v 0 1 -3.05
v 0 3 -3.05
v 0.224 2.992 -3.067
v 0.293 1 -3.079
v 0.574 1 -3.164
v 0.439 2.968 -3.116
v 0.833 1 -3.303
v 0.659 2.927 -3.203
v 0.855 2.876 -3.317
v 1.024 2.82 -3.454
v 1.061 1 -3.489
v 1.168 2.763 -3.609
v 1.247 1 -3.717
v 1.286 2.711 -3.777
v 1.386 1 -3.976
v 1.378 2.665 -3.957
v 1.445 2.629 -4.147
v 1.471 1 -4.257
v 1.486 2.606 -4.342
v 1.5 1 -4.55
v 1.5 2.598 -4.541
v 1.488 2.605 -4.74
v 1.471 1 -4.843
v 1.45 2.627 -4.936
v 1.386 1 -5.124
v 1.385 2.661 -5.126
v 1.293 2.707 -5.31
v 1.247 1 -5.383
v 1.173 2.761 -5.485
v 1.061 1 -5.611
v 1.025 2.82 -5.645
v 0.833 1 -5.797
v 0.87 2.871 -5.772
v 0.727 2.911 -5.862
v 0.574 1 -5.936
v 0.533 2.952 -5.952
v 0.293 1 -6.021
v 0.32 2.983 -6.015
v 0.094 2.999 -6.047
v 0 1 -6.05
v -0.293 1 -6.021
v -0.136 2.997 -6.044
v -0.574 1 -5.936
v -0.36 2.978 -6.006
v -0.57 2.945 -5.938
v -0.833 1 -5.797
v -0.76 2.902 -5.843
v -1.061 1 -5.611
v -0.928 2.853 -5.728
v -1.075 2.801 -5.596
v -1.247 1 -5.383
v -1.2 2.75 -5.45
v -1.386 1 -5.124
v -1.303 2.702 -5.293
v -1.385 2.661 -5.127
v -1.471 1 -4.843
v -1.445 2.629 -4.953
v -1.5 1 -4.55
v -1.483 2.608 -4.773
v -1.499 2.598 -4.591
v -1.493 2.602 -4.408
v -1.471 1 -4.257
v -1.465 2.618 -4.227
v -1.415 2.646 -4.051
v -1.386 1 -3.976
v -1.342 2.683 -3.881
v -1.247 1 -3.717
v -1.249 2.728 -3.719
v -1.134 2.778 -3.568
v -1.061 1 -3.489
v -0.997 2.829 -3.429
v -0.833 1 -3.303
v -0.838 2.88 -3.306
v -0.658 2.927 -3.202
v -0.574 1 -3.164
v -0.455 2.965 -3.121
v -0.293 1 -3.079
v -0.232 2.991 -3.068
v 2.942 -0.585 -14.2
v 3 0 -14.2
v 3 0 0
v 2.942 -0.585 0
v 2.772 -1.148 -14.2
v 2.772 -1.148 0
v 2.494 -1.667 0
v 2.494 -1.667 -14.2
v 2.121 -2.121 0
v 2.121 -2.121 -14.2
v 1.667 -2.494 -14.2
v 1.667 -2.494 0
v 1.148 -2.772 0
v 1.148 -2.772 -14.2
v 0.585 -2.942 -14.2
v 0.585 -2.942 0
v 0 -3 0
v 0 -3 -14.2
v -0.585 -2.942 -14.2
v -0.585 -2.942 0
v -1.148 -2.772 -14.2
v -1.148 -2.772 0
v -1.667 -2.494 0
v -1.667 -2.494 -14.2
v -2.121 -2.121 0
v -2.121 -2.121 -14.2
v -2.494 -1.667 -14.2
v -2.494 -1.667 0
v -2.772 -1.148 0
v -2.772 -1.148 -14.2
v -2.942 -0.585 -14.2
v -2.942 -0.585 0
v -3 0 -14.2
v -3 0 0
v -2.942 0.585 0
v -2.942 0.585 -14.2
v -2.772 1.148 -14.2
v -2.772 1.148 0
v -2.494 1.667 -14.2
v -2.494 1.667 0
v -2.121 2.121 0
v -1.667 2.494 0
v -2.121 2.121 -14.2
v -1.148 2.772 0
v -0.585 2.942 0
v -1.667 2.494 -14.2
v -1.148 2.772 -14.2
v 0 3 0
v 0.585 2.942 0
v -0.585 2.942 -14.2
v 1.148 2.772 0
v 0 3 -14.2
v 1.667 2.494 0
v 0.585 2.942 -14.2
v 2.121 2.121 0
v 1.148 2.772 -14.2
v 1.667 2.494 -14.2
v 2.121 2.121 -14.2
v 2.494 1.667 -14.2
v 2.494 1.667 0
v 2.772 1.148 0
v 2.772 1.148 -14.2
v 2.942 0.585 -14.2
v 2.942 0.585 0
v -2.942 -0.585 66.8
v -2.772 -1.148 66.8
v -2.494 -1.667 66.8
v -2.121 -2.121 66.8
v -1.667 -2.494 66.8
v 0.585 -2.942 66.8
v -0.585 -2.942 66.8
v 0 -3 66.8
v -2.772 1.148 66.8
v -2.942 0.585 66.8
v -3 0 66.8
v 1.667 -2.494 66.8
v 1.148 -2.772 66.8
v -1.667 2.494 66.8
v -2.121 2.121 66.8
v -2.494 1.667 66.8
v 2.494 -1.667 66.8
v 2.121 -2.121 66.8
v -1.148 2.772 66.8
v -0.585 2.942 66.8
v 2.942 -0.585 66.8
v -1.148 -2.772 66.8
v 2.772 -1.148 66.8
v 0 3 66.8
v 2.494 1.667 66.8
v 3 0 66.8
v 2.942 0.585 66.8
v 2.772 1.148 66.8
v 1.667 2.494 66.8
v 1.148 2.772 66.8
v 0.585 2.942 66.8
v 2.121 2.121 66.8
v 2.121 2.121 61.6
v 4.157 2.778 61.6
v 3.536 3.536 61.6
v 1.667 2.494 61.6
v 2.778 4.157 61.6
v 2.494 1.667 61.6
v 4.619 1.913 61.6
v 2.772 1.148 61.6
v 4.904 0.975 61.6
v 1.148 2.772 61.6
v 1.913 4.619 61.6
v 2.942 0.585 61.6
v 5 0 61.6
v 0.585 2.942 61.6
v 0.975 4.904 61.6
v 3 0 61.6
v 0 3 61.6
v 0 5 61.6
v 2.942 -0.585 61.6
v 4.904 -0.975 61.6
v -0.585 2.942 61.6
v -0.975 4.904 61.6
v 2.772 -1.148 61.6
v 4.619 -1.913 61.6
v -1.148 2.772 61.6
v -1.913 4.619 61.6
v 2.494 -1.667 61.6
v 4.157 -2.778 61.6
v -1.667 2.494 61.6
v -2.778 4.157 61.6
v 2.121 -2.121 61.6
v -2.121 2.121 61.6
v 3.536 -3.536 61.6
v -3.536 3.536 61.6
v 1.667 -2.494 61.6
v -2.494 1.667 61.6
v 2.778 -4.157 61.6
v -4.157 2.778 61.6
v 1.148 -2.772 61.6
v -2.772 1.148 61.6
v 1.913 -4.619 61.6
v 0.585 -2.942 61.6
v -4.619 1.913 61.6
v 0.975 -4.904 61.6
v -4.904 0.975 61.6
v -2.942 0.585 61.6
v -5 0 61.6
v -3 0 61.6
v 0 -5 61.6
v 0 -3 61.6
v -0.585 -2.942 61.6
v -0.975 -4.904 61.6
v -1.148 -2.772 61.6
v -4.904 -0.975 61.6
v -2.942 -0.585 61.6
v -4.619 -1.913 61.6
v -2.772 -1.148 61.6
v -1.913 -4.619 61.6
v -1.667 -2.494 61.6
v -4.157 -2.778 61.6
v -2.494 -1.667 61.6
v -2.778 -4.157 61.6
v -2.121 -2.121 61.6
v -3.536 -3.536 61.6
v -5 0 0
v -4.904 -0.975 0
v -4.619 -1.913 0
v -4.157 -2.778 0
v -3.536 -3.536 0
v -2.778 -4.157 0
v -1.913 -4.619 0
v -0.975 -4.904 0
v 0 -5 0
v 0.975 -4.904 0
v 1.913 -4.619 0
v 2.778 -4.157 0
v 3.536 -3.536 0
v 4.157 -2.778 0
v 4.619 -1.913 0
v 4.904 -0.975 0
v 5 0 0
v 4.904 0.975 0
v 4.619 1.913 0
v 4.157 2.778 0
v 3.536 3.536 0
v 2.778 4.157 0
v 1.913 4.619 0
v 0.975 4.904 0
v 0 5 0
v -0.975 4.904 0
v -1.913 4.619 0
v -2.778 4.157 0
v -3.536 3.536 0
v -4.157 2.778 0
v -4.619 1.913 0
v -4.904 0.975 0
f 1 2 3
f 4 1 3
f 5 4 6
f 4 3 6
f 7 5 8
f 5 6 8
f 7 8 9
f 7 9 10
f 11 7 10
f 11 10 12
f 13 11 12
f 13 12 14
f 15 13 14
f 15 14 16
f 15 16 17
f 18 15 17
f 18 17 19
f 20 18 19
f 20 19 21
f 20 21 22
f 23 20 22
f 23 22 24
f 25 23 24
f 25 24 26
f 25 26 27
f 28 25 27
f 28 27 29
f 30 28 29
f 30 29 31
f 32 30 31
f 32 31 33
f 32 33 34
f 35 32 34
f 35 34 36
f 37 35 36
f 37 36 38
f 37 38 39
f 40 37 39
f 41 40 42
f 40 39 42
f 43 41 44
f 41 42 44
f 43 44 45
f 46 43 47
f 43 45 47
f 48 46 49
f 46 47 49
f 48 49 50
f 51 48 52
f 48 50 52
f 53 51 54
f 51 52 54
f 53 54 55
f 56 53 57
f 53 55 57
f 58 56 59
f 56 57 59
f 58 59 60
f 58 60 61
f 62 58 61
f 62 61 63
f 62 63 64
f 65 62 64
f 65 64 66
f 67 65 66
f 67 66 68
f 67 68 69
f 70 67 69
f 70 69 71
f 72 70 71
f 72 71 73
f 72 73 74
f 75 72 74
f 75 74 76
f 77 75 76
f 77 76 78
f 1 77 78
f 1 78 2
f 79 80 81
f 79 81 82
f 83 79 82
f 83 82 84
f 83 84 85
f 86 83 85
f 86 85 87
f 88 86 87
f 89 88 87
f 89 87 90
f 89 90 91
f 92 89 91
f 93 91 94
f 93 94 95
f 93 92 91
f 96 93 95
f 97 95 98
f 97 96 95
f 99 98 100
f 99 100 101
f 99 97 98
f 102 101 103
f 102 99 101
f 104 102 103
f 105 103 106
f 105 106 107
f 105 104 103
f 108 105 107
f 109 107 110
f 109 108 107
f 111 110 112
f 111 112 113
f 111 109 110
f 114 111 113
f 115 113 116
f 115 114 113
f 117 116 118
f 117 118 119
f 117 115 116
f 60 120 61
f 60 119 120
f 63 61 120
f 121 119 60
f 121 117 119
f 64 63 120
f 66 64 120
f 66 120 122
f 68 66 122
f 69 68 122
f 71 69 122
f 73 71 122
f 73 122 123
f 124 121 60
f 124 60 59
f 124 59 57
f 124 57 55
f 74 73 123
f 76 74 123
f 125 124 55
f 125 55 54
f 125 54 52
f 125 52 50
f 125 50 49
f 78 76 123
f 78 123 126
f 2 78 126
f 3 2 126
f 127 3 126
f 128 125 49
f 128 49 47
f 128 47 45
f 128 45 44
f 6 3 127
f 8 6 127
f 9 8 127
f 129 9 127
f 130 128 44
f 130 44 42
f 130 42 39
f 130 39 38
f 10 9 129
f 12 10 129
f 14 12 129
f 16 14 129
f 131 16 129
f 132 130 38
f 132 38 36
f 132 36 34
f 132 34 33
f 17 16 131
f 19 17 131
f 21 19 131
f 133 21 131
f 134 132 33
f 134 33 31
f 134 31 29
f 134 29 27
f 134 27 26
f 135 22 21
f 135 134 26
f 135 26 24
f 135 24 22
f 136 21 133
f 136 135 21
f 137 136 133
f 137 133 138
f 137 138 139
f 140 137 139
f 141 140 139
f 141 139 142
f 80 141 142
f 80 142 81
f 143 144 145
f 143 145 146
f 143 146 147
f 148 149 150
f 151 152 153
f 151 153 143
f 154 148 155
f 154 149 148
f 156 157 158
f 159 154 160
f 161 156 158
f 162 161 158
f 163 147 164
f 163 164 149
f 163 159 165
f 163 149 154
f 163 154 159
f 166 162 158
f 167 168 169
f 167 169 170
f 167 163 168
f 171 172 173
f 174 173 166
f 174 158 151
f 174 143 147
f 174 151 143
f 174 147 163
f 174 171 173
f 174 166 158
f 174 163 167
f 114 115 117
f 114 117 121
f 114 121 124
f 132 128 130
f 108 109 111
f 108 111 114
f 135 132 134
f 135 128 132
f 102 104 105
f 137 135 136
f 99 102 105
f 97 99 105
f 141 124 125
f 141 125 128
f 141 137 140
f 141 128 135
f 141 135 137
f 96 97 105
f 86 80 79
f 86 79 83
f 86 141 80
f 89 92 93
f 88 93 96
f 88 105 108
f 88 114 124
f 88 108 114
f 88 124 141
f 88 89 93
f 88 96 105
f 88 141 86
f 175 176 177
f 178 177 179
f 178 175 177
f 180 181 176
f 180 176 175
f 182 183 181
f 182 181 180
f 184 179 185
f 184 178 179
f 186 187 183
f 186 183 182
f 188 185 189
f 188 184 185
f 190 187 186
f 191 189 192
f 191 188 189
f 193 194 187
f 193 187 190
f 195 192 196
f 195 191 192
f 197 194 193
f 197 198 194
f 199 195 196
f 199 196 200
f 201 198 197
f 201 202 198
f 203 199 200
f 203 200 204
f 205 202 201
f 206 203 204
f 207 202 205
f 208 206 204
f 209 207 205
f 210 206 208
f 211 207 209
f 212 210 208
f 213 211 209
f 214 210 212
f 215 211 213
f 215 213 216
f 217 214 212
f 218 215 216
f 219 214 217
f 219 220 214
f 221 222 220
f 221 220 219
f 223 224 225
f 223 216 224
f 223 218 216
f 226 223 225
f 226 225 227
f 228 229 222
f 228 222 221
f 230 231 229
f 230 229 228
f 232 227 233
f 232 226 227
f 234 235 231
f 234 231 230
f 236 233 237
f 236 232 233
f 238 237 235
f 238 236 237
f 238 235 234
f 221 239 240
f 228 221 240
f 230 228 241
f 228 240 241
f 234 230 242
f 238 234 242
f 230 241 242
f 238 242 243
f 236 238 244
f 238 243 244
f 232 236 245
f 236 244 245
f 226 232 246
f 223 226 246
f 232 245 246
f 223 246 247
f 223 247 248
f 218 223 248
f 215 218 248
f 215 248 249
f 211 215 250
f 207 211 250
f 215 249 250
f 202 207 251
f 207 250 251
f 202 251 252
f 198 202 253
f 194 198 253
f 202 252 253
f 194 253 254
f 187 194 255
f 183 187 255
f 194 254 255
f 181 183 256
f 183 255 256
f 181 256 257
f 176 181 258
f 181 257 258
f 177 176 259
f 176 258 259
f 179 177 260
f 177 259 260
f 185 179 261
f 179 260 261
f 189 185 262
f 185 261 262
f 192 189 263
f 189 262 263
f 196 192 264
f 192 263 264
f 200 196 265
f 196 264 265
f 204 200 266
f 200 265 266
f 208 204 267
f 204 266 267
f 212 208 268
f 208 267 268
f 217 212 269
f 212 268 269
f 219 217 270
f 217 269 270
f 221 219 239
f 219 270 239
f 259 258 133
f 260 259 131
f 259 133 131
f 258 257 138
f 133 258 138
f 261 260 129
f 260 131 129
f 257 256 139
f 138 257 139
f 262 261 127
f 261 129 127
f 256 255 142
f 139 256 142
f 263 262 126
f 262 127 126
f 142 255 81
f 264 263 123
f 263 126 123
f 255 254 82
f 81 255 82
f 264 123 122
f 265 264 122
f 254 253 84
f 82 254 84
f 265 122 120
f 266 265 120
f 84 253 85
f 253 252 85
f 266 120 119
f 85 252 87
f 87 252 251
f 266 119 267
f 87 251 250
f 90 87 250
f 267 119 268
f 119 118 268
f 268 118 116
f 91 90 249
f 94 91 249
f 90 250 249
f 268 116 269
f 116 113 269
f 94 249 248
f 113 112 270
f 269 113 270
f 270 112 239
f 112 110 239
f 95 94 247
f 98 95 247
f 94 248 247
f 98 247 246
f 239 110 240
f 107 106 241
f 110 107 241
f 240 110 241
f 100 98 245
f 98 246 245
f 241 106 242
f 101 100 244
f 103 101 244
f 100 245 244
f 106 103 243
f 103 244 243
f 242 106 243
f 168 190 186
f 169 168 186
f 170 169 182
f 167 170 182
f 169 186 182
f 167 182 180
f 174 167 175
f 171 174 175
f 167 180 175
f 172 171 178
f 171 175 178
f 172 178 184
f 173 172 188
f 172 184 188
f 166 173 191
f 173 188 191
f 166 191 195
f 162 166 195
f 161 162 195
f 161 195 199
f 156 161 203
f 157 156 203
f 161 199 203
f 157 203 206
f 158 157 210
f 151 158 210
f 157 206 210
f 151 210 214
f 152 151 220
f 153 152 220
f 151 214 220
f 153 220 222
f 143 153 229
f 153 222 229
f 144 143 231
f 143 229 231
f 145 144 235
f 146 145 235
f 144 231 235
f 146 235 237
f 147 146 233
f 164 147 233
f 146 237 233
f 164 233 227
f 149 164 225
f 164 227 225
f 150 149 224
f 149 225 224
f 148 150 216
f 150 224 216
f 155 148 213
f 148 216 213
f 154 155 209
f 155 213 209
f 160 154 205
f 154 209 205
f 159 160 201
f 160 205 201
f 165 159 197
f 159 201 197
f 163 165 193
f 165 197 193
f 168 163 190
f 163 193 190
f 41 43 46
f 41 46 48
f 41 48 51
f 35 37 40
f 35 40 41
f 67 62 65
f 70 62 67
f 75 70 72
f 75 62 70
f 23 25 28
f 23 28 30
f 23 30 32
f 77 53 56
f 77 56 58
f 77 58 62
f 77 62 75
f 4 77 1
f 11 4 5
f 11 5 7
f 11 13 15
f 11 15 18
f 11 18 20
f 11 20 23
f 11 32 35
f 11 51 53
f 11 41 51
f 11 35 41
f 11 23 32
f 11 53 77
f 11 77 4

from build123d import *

# Parameters (mm, degrees)
SKETCH1_R      = 5
EXTRUDE1_DEPTH = 61.6
SKETCH2_R      = 3
EXTRUDE2_DEPTH = 5.2
EXTRUDE3_START = 14.2
SKETCH3_R      = 3
EXTRUDE3_DEPTH = 14.2
SKETCH5_R      = 1.5
EXTRUDE5_DEPTH = 2


with BuildPart() as part:
    # Sketch1 → Extrude1 (new body)
    with BuildSketch(Plane.XY):
        with Locations(Location((0, 0, 0), (0, 0, 180))):
            Circle(SKETCH1_R)
    extrude(amount=EXTRUDE1_DEPTH)

    # Sketch2 → Extrude2 (add)
    with BuildSketch(Plane.XY.offset(61.6)):
        Circle(SKETCH2_R)
    extrude(amount=EXTRUDE2_DEPTH)

    # Sketch3 → Extrude3 (add)
    with BuildSketch(Plane(origin=(0, 0, 0), x_dir=(-1, 0, 0), z_dir=(0, 0, -1)).offset(EXTRUDE3_START)):
        with Locations(Location((0, 0, 0), (0, 0, 180))):
            Circle(SKETCH3_R)
    extrude(amount=-EXTRUDE3_DEPTH)

    # Sketch5 → Extrude5 (cut)
    with BuildSketch(Plane(origin=(0, 3, 0), x_dir=(-1, 0, 0), z_dir=(0, 1, 0))):
        with Locations(Location((0, -4.55, 0), (0, 0, 90))):
            Circle(SKETCH5_R)
    extrude(amount=-EXTRUDE5_DEPTH, mode=Mode.SUBTRACT)


solid = part.part
